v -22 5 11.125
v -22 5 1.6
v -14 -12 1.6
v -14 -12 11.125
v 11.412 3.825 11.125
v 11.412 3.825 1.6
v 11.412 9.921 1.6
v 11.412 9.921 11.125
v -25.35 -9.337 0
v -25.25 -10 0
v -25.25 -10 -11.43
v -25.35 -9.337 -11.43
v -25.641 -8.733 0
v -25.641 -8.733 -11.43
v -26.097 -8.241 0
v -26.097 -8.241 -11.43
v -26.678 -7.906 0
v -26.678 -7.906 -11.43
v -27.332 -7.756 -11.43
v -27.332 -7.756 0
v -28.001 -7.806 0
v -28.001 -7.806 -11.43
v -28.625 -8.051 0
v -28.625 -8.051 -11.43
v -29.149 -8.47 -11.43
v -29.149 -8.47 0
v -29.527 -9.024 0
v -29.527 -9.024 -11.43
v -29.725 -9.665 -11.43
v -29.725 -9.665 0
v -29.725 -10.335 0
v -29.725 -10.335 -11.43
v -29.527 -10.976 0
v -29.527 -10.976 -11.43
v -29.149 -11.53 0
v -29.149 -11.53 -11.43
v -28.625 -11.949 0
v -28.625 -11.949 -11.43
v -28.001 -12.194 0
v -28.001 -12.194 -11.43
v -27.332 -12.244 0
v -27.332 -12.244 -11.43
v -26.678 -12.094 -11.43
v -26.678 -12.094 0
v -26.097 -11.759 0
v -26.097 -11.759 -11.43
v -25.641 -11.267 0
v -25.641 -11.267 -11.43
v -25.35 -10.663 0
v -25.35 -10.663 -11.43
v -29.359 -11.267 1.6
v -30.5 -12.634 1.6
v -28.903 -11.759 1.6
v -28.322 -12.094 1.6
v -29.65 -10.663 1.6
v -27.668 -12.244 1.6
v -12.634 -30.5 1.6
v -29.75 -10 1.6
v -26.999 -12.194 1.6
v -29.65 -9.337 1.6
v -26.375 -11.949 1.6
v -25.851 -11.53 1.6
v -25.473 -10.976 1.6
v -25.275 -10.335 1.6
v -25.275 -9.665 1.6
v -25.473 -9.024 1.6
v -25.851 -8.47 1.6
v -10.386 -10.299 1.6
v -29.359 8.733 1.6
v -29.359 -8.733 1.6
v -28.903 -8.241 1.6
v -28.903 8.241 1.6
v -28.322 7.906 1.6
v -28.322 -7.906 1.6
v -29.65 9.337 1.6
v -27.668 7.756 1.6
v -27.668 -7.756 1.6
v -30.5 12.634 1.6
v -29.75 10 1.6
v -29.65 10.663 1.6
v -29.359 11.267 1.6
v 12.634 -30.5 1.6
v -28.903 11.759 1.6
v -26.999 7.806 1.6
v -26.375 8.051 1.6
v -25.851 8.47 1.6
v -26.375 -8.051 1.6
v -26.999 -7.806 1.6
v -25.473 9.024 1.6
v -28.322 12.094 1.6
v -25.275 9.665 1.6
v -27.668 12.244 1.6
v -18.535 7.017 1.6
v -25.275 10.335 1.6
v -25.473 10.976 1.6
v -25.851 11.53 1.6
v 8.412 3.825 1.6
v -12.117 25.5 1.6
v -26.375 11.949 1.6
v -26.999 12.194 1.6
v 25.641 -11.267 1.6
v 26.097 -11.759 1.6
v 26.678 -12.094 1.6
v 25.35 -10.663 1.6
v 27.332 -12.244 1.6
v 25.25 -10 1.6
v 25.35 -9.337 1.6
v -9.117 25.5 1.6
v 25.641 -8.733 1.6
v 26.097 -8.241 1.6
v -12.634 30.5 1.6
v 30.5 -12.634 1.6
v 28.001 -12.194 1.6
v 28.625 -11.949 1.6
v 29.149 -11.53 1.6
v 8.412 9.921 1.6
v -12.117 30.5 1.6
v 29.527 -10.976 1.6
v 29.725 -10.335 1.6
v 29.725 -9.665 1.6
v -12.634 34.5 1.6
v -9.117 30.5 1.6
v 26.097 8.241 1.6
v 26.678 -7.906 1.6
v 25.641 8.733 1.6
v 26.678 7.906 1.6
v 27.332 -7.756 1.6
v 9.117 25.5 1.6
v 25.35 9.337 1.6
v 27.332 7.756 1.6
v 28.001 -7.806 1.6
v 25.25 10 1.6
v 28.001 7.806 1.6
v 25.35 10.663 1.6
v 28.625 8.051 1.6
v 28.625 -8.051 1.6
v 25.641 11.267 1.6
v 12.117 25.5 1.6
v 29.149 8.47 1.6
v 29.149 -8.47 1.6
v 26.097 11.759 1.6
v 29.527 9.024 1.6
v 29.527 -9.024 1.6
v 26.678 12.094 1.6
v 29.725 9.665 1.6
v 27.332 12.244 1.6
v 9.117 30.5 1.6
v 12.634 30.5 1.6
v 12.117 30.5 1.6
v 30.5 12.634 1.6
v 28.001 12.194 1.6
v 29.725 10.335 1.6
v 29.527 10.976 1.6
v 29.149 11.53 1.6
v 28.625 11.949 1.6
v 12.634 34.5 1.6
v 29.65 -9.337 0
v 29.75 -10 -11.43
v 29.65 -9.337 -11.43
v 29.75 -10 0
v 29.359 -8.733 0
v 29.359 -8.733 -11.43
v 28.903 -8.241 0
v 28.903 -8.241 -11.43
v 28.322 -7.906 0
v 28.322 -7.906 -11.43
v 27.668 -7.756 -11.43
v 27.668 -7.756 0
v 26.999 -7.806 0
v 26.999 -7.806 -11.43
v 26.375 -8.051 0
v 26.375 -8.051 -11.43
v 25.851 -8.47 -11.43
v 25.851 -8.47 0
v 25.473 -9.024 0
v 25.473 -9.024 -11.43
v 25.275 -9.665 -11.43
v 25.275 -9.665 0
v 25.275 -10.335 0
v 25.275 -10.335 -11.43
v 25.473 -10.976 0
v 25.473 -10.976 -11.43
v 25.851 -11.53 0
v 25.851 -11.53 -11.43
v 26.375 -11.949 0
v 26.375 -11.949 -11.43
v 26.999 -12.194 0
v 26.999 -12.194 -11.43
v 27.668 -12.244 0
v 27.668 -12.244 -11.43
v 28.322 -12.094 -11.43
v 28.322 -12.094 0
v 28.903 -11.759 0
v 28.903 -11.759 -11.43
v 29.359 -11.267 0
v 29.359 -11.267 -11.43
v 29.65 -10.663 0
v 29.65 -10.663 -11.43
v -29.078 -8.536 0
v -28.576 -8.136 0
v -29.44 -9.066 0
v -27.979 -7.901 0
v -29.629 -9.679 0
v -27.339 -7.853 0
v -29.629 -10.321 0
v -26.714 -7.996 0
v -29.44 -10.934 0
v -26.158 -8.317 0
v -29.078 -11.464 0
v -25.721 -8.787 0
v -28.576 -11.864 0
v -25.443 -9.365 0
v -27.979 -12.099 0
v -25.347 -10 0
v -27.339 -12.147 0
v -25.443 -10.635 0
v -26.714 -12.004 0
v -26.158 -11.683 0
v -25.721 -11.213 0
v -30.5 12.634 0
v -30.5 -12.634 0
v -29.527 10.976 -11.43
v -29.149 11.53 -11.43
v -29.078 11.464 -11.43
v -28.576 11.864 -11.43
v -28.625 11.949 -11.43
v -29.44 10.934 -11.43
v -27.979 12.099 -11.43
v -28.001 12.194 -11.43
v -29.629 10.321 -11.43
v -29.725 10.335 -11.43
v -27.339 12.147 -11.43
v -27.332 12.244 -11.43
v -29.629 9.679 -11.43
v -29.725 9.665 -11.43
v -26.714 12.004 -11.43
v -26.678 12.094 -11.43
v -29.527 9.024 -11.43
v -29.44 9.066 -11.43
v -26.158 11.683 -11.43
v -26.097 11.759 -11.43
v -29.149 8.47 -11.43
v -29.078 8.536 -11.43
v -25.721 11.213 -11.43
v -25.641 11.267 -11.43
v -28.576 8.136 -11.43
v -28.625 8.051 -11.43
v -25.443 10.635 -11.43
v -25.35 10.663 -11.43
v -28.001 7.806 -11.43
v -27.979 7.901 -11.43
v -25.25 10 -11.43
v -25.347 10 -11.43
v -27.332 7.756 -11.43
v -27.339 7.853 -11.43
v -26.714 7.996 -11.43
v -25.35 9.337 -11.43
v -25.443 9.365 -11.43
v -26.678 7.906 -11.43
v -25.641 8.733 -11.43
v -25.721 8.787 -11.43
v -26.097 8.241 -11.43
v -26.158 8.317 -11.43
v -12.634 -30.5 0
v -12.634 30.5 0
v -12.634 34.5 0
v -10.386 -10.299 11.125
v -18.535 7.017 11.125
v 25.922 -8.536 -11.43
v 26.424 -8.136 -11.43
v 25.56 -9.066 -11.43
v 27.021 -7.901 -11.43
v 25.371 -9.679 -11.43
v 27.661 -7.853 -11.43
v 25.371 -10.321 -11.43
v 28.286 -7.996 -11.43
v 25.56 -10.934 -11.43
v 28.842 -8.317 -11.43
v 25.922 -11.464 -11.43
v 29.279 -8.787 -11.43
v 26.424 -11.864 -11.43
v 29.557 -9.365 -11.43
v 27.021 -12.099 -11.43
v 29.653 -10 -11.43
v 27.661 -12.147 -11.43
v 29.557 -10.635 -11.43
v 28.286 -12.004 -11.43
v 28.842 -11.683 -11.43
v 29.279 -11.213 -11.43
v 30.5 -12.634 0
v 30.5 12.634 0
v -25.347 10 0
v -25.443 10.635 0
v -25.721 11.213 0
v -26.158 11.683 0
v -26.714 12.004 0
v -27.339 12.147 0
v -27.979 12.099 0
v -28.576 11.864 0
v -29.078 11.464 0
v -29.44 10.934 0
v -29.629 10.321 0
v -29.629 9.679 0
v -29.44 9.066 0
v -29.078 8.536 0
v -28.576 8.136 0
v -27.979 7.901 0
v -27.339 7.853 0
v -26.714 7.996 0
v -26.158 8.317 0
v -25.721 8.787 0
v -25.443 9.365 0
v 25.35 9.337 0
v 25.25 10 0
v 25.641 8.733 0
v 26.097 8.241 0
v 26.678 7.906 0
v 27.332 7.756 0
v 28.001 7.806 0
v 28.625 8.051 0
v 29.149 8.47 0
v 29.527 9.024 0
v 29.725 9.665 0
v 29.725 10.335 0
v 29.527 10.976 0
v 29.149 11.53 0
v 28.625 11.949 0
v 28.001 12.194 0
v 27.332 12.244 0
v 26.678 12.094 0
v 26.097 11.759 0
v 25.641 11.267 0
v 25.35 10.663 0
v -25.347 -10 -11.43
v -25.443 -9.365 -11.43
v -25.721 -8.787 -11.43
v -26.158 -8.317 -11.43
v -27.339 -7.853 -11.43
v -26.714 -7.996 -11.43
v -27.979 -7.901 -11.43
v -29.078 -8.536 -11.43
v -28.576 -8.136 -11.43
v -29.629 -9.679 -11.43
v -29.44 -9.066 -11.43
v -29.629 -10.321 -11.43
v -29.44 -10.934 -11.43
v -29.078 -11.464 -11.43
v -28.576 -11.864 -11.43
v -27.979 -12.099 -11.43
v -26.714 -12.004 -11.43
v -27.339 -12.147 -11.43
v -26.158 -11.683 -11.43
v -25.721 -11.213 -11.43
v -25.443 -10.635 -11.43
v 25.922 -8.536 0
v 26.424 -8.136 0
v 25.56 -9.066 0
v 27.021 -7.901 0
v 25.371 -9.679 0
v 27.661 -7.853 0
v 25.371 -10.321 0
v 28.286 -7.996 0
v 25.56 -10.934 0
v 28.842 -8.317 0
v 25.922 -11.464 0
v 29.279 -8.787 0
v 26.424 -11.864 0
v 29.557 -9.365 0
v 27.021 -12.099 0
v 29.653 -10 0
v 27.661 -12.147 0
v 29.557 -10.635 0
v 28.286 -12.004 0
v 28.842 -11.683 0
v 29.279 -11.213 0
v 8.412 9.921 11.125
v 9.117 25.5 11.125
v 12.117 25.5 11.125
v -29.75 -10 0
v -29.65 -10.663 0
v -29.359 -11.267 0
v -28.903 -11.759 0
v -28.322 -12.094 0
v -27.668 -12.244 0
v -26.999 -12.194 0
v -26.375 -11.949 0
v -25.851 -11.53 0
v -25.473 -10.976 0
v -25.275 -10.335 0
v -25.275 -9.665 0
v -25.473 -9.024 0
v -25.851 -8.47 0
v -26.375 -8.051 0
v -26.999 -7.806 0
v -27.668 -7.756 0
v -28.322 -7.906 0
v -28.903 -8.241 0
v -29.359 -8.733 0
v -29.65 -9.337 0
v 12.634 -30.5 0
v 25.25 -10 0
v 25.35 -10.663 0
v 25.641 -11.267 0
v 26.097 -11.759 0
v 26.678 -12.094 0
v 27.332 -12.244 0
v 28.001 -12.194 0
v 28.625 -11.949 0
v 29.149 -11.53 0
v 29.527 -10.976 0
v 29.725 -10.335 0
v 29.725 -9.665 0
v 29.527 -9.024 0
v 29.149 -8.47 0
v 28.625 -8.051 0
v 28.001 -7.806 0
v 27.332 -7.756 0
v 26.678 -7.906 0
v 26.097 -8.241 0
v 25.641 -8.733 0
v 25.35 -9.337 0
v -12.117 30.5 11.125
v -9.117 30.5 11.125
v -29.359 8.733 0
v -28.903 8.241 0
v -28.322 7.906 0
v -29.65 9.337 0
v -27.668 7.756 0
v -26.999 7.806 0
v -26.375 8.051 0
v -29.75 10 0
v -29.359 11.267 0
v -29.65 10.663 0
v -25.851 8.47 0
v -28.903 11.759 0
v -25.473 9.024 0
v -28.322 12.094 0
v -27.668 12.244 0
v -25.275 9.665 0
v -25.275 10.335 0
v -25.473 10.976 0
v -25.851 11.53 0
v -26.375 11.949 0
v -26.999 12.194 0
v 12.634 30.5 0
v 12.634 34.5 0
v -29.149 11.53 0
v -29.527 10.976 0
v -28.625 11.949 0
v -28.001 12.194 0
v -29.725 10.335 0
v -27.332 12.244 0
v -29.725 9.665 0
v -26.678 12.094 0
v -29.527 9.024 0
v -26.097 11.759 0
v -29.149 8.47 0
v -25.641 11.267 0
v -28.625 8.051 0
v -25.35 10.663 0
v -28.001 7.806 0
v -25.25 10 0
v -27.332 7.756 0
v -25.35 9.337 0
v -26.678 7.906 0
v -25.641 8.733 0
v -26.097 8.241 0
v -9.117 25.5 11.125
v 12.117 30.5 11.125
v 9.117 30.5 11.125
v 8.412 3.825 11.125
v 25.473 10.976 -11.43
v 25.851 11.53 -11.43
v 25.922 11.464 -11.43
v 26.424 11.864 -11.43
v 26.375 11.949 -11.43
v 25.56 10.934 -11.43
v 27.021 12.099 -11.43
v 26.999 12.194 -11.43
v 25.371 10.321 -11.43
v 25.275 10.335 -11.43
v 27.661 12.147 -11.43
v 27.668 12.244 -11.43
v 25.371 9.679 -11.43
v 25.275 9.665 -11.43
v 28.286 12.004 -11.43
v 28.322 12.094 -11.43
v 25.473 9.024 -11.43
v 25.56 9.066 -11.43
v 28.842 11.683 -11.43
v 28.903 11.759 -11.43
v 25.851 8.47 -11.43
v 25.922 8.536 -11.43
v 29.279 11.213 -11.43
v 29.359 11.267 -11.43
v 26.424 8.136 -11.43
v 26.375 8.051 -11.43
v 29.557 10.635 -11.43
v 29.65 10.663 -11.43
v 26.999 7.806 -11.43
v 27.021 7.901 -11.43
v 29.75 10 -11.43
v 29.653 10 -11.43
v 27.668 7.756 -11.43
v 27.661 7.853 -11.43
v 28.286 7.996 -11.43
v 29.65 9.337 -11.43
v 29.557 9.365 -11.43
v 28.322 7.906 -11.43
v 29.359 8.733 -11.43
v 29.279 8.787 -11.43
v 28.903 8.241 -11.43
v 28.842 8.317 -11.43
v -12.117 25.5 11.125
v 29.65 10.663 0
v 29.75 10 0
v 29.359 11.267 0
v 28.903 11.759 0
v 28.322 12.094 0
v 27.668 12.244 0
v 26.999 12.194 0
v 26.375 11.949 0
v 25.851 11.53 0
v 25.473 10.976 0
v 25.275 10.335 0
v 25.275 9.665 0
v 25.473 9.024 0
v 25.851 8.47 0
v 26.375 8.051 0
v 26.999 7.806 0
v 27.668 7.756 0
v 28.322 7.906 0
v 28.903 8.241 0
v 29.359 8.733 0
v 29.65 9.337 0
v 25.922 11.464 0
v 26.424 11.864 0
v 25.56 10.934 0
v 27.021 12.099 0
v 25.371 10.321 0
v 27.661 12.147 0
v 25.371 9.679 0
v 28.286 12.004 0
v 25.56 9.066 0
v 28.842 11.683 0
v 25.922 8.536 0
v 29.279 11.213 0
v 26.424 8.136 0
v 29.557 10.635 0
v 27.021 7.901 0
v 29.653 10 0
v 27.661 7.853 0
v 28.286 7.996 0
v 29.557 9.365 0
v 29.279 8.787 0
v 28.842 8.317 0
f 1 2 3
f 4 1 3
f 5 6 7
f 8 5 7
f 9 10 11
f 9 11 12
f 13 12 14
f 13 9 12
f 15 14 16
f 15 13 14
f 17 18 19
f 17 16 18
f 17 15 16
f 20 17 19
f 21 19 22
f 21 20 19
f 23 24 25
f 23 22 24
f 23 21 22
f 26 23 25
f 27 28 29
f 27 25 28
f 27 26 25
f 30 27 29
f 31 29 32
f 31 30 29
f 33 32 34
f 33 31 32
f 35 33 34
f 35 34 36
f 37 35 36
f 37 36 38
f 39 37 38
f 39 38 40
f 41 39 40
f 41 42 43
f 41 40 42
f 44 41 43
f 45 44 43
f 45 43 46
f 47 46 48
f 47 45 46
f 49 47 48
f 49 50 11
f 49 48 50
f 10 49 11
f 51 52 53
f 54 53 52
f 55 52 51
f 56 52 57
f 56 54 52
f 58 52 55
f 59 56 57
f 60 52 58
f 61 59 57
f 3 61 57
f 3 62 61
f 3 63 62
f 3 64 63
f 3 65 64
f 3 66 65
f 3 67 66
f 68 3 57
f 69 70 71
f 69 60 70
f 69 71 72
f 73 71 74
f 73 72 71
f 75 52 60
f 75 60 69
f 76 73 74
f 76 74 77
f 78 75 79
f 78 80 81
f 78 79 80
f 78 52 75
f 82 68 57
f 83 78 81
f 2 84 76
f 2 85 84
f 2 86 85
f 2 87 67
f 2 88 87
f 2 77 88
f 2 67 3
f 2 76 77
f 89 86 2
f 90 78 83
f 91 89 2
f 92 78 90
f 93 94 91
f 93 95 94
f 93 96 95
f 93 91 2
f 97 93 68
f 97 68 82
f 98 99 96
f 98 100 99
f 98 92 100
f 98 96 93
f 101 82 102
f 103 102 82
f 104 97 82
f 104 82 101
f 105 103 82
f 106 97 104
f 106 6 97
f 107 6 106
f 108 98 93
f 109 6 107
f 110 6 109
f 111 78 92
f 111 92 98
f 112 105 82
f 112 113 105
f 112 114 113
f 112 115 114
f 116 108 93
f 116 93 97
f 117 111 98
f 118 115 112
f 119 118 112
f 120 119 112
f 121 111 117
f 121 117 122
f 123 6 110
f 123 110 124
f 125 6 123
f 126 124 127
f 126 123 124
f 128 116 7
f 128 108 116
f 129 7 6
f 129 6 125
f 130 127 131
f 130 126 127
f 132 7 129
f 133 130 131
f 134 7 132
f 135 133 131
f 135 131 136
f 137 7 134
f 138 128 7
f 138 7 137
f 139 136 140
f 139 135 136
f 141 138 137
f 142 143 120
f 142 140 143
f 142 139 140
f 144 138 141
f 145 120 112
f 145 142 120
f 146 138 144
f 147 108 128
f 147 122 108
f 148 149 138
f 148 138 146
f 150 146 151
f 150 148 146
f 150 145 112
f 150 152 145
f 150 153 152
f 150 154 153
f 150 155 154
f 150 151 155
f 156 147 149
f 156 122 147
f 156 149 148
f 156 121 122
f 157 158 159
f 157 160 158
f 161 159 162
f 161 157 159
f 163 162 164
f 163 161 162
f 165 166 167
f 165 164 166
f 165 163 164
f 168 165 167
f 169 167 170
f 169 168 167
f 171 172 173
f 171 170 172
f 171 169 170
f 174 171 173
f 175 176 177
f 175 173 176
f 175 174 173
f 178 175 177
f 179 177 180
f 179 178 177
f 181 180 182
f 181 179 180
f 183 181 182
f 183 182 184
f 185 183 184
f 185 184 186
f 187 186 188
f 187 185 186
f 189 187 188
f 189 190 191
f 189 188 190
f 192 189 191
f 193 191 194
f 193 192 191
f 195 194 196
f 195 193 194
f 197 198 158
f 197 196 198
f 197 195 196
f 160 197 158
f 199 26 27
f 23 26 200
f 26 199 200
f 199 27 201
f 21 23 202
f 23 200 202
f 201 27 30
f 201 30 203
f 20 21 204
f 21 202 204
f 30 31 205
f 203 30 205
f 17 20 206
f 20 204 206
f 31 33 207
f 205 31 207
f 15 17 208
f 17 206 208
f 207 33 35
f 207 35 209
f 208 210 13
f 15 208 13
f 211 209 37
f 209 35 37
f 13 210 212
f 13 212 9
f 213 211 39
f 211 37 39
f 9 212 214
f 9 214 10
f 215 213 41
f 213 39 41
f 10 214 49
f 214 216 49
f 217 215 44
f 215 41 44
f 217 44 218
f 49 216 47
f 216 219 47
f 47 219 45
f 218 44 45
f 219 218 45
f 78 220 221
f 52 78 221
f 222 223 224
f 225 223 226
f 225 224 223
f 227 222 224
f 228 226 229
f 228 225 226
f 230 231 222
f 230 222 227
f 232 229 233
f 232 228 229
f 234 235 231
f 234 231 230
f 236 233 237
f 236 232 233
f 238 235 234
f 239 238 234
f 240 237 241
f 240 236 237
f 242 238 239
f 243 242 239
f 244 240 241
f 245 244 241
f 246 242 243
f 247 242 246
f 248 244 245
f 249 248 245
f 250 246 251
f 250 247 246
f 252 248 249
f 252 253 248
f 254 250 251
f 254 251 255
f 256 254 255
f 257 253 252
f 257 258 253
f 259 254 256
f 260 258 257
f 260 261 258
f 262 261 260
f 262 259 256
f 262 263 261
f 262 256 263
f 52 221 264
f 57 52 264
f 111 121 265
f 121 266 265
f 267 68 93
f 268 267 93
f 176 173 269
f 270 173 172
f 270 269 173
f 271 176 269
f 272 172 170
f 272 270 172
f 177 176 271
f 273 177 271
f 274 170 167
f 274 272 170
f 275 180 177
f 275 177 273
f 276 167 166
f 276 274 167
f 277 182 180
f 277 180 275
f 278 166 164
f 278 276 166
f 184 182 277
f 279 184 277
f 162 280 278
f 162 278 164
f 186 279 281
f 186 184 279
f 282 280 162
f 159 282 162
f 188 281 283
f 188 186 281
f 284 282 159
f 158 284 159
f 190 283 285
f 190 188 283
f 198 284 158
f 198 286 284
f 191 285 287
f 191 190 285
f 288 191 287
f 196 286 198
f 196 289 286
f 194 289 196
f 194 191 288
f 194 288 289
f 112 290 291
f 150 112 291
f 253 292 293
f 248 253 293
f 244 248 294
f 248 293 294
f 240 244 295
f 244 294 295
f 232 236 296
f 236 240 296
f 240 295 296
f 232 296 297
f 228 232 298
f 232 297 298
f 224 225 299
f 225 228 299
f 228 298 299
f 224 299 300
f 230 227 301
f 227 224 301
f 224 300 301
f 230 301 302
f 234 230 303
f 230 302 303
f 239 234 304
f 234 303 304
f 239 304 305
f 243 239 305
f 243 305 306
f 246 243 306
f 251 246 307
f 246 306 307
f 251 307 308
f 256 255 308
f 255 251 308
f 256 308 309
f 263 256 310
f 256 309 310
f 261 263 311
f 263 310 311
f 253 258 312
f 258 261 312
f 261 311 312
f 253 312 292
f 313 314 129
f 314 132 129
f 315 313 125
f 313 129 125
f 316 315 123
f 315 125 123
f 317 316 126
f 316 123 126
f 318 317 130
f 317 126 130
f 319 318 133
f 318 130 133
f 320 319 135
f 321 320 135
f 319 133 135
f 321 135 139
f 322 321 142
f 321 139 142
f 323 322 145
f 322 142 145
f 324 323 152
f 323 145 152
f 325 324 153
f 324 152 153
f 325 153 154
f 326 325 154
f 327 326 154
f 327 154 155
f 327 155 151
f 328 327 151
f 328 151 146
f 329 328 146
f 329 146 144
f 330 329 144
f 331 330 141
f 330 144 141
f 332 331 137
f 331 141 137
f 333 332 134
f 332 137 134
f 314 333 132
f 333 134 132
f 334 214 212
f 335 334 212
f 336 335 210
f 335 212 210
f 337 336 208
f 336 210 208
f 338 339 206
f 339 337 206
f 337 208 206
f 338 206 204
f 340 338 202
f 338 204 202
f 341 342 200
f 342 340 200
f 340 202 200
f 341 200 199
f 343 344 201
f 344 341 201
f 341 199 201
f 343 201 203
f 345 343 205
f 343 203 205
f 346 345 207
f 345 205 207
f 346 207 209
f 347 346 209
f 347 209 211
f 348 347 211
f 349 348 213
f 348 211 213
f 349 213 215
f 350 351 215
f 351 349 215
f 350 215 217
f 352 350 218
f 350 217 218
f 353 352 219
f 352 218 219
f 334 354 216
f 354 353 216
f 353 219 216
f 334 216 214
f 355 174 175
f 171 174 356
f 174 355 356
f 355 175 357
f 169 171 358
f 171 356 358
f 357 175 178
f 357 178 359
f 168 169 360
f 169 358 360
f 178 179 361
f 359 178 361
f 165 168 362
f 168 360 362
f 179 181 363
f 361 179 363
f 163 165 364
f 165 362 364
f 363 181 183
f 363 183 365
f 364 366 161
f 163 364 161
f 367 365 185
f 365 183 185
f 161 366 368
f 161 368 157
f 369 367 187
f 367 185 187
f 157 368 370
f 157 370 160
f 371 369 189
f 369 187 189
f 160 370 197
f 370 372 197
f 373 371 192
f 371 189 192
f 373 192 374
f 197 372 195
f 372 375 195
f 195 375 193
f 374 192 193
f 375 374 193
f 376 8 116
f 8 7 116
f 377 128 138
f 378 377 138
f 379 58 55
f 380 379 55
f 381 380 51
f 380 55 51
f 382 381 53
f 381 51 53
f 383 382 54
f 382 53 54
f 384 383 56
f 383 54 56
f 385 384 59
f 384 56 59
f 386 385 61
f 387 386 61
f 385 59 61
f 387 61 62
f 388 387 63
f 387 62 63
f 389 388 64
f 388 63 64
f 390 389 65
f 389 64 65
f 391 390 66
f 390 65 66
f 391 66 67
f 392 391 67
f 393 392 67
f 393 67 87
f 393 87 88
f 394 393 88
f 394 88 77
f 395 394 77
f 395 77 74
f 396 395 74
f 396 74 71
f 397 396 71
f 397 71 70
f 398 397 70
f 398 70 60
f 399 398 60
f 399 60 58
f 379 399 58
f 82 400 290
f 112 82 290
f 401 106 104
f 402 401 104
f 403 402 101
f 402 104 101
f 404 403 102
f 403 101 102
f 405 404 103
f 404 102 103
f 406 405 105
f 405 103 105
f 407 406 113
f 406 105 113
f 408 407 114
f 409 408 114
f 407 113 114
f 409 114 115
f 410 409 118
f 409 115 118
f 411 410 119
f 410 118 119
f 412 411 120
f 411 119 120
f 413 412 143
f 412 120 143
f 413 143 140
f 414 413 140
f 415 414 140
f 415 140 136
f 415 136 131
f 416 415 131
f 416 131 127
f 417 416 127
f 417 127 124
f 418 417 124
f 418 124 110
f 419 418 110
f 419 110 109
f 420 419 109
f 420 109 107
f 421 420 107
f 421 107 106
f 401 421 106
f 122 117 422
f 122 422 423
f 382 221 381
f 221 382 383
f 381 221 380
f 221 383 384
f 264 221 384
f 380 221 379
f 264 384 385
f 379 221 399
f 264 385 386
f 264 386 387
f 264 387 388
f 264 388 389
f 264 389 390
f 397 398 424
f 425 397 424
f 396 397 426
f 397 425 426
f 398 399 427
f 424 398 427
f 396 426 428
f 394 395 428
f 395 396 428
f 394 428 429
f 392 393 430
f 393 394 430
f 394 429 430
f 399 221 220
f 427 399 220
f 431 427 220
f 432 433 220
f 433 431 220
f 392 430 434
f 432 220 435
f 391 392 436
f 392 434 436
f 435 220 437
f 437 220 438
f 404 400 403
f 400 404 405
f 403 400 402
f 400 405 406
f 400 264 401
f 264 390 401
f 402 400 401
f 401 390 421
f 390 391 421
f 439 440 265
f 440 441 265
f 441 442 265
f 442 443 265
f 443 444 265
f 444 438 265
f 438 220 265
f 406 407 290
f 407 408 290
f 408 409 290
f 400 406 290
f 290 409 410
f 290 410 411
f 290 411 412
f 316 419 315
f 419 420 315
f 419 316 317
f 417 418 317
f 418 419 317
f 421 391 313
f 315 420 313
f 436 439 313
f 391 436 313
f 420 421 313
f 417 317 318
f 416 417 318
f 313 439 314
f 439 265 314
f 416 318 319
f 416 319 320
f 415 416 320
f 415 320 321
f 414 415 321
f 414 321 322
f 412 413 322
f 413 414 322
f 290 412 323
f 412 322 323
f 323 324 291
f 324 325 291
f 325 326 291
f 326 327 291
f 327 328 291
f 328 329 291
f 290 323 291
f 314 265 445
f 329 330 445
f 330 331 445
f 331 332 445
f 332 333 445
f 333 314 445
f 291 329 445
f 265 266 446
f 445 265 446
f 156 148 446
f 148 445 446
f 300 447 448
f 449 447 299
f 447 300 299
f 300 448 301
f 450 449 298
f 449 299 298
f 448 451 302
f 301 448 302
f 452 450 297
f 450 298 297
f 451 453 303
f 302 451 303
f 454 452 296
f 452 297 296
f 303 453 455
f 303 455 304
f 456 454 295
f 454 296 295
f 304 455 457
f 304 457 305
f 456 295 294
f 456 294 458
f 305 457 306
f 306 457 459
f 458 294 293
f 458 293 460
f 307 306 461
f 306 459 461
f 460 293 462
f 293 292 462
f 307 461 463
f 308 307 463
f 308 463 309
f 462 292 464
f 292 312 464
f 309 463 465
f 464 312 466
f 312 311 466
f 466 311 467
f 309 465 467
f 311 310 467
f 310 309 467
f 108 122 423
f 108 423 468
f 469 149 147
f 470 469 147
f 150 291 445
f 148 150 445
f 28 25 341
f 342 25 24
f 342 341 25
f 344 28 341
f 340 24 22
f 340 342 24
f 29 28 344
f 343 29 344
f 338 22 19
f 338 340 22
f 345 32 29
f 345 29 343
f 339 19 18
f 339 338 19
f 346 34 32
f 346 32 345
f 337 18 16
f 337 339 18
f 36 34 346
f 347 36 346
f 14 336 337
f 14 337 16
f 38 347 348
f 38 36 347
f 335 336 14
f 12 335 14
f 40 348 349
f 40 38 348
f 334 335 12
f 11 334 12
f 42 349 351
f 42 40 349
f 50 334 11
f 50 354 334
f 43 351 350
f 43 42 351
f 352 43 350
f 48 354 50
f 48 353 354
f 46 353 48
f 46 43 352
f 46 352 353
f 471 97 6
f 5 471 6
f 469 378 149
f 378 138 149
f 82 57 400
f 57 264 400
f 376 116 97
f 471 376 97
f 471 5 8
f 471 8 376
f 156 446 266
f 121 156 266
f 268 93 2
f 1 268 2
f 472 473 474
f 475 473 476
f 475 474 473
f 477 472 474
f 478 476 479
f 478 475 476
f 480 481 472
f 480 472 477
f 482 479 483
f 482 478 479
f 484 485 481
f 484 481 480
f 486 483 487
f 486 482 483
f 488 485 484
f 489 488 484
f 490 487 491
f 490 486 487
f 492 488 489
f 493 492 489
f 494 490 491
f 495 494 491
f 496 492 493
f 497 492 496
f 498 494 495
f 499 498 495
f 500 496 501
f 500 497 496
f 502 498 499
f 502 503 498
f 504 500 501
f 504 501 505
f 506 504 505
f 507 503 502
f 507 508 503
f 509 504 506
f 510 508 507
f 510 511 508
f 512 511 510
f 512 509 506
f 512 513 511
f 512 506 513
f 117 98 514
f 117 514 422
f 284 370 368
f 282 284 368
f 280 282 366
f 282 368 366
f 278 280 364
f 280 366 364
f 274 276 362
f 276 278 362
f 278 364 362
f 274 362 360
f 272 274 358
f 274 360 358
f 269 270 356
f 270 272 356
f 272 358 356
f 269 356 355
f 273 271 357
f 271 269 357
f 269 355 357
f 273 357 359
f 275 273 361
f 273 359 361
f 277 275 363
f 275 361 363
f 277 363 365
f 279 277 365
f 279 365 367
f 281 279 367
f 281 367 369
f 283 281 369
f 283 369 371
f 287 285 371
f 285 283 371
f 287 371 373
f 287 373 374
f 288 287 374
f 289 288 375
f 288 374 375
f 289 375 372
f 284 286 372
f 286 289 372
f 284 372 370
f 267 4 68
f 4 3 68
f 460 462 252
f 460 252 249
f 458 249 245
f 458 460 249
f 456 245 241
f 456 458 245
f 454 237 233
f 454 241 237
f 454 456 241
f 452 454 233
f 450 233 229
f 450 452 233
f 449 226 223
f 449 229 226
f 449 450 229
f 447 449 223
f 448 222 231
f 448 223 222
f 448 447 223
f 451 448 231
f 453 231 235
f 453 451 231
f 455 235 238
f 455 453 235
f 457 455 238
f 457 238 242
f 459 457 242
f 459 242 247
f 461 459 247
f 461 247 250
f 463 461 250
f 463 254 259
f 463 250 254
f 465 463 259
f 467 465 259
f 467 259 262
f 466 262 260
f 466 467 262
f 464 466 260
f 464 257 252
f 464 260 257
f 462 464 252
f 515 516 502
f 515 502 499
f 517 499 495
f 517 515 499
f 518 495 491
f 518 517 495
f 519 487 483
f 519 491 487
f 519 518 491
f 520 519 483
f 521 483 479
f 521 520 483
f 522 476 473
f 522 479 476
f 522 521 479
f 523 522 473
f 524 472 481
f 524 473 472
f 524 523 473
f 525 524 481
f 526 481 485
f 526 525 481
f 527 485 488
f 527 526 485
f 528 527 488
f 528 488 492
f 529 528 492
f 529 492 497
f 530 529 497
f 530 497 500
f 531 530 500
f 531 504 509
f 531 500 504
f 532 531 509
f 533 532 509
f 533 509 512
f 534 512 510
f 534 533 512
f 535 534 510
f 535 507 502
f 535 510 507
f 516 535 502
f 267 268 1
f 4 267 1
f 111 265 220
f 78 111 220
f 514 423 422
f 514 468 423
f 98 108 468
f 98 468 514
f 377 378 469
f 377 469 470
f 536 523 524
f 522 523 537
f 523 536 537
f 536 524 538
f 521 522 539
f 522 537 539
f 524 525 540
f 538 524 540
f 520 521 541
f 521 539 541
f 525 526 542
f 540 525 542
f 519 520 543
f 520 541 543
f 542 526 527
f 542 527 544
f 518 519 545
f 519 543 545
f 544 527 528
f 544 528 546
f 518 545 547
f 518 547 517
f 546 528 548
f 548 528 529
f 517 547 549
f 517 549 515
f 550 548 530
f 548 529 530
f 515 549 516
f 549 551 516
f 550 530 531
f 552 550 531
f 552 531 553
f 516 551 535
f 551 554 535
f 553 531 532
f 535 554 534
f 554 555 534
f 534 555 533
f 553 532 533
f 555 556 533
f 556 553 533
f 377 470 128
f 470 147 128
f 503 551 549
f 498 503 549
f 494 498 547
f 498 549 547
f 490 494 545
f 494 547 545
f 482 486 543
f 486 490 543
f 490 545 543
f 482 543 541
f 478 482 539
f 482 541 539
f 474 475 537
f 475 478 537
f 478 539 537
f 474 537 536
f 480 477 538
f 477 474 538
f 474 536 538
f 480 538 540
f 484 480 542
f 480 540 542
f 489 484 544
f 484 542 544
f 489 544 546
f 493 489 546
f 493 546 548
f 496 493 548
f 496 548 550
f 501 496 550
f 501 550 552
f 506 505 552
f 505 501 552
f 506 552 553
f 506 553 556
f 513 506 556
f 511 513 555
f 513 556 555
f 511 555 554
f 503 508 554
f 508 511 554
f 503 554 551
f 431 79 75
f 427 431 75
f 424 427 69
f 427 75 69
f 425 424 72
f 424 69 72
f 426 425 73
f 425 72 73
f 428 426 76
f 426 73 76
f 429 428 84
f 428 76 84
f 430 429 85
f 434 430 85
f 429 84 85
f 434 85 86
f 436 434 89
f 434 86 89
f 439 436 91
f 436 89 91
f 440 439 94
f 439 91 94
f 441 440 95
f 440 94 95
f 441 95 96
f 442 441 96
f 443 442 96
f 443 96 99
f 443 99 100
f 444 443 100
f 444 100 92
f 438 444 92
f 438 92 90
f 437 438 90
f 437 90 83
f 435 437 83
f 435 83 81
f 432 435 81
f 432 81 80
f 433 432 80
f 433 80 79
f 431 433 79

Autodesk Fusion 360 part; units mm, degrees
sketch "Sketch9" plane through (0, 0, 0) normal (0, 0, 1) x (1, 0, 0)
  line L0 (-30.5, -12.6335) -> (-12.6335, -30.5)
  line L1 (-12.6335, -30.5) -> (12.6335, -30.5)
  line L2 (12.6335, -30.5) -> (30.5, -12.6335)
  line L3 (30.5, -12.6335) -> (30.5, 12.6335)
  line L4 (30.5, 12.6335) -> (12.6335, 30.5)
  line L5 (12.6335, 30.5) -> (-12.6335, 30.5)
  line L6 (-12.6335, 30.5) -> (-30.5, 12.6335)
  line L7 (-30.5, 12.6335) -> (-30.5, -12.6335)
  line L8 (-12.6335, 30.5) -> (12.6335, 30.5)
  line L9 (12.6335, 30.5) -> (12.6335, 34.5)
  line L10 (12.6335, 34.5) -> (-12.6335, 34.5)
  line L11 (-12.6335, 34.5) -> (-12.6335, 30.5)
  dimension "d23" = 30.5
  dimension "d33" = 4
extrude "Extrude1" add sketch "Sketch9" along normal blind 1.6 makes body 1
sketch "Sketch11" plane through (0, 0, 1.6) normal (0, 0, 1) x (-1, 0, 0)
  line L0 (30.5, -12.6335) -> (30.5, 12.6335)
  line L1 (30.5, 12.6335) -> (12.6335, 30.5)
  line L2 (12.6335, 30.5) -> (-12.6335, 30.5)
  line L3 (-12.6335, 30.5) -> (-30.5, 12.6335)
  line L4 (-30.5, 12.6335) -> (-30.5, -12.6335)
  line L5 (-30.5, -12.6335) -> (-12.6335, -30.5)
  line L6 (12.6335, -30.5) -> (30.5, -12.6335)
  circle A0 centre (-27.5, -10) radius 2.25
  line L7 (0, 0) -> (0, -30.5) construction
  line L8 (0, 0) -> (30.5, 0) construction
  circle A1 centre (27.5, -10) radius 2.25
  circle A2 centre (27.5, 10) radius 2.25
  circle A3 centre (-27.5, 10) radius 2.25
  line L9 (12.6335, -34.5) -> (12.6335, -30.5)
  line L10 (-12.6335, -30.5) -> (-12.6335, -34.5)
  line L11 (-12.6335, -34.5) -> (12.6335, -34.5)
  dimension "d26" = 4.5
  dimension "d27" = 10
  dimension "d28" = 27.5
extrude "Extrude2" cut sketch "Sketch11" against normal through all contours A0 | A1 | A2 | A3 bodies 1
sketch "Sketch12" plane through (0, 0, 0) normal (0, 0, -1) x (1, 0, 0)
  circle A0 centre (-27.5, 10) radius 2.25
  circle A1 centre (27.5, 10) radius 2.25
  circle A2 centre (-27.5, -10) radius 2.25
  circle A3 centre (27.5, -10) radius 2.25
  line L0 (-30.5, 12.6335) -> (-30.5, -12.6335)
  line L1 (-30.5, -12.6335) -> (-12.6335, -30.5)
  line L2 (12.6335, -30.5) -> (30.5, -12.6335)
  line L3 (30.5, -12.6335) -> (30.5, 12.6335)
  line L4 (30.5, 12.6335) -> (12.6335, 30.5)
  line L5 (12.6335, 30.5) -> (-12.6335, 30.5)
  line L6 (-12.6335, 30.5) -> (-30.5, 12.6335)
  circle A4 centre (-27.5, 10) radius 2.25
  circle A5 centre (27.5, -10) radius 2.25
  circle A6 centre (27.5, -10) radius 2.1527
  line L7 (0, -30.5) -> (0, 30.5) construction
  line L8 (30.5, 0) -> (-30.5, 0) construction
  line L9 (27.5, -10) -> (0, -10) construction
  circle A7 centre (-27.5, -10) radius 2.1527
  circle A8 centre (-27.5, -10) radius 2.25
  line L10 (-27.5, -10) -> (0, -10) construction
  line L11 (27.5, -10) -> (27.5, 10) construction
  line L12 (-27.5, -10) -> (-27.5, 10) construction
  circle A9 centre (27.5, 10) radius 2.1527
  circle A10 centre (27.5, 10) radius 2.25
  circle A11 centre (-27.5, 10) radius 2.1527
  circle A12 centre (-27.5, 10) radius 2.25
  line L13 (27.5, 10) -> (27.5, -10) construction
  line L14 (-27.5, 10) -> (-27.5, -10) construction
  line L15 (-12.6335, -30.5) -> (-12.6335, -34.5)
  line L16 (-12.6335, -34.5) -> (12.6335, -34.5)
  line L17 (12.6335, -34.5) -> (12.6335, -30.5)
extrude "Extrude3" add sketch "Sketch12" along normal blind 11.43 separate body contours A0 A4 A12 | A1 A10 | A2 A8 | A3 A5 makes body 2 at (-25.2612, -9.776, -7.62) makes body 3 at (-25.2612, 10.224, -7.62) makes body 4 at (29.7388, -9.776, -7.62) makes body 5 at (29.7388, 10.224, -7.62)
sketch "Sketch13" plane through (0, 0, 1.6) normal (0, 0, 1) x (-1, 0, 0)
  circle A0 centre (27.5, 10) radius 2.25
  circle A1 centre (-27.5, 10) radius 2.25
  circle A2 centre (27.5, -10) radius 2.25
  circle A3 centre (-27.5, -10) radius 2.25
  line L0 (12.6335, -34.5) -> (12.6335, -30.5)
  line L1 (12.6335, -30.5) -> (30.5, -12.6335)
  line L2 (30.5, -12.6335) -> (30.5, 12.6335)
  line L3 (30.5, 12.6335) -> (12.6335, 30.5)
  line L4 (12.6335, 30.5) -> (-12.6335, 30.5)
  line L5 (-12.6335, 30.5) -> (-30.5, 12.6335)
  line L6 (-30.5, 12.6335) -> (-30.5, -12.6335)
  line L7 (-30.5, -12.6335) -> (-12.6335, -30.5)
  line L8 (-12.6335, -30.5) -> (-12.6335, -34.5)
  line L9 (-12.6335, -34.5) -> (12.6335, -34.5)
  line L10 (22, -5) -> (14, 12)
  line L11 (14, 12) -> (10.3858, 10.2992)
  line L12 (10.3858, 10.2992) -> (18.5347, -7.0172)
  line L13 (18.5347, -7.0172) -> (22, -5)
  line L14 (12.1173, -30.5) -> (9.1173, -30.5)
  line L15 (9.1173, -30.5) -> (9.1173, -25.5)
  line L16 (9.1173, -25.5) -> (12.1173, -25.5)
  line L17 (12.1173, -25.5) -> (12.1173, -30.5)
  line L18 (9.1173, -30.5) -> (0, -30.5) construction
  line L19 (0, -30.5) -> (0, -21.6781) construction
  line L20 (-12.1173, -30.5) -> (-9.1173, -30.5)
  line L21 (-9.1173, -30.5) -> (-9.1173, -25.5)
  line L22 (-12.1173, -25.5) -> (-12.1173, -30.5)
  line L23 (-9.1173, -25.5) -> (-12.1173, -25.5)
  line L24 (-9.1173, -30.5) -> (0, -30.5) construction
  line L25 (-11.4116, -35.3207) -> (-11.4116, -9.9207) construction
  line L26 (-11.4116, -9.9207) -> (-8.4116, -9.9207)
  line L27 (-8.4116, -9.9207) -> (-8.4116, -3.8247)
  line L28 (-8.4116, -3.8247) -> (-11.4116, -3.8247)
  line L29 (-11.4116, -3.8247) -> (-11.4116, -9.9207)
  dimension "d34" = 3
  dimension "d35" = 5
  dimension "d36" = 25.4
  dimension "d38" = 3
  dimension "d39" = 6.096
extrude "Extrude4" add sketch "Sketch13" along normal blind 9.525 contours L10 L11 L12 L13 | L14 L15 L16 L17 | L20 L21 L22 L23 | L26 L27 L28 L29 bodies 1
equation "d28 = ( 55 / 2 ) * 1 mm"
